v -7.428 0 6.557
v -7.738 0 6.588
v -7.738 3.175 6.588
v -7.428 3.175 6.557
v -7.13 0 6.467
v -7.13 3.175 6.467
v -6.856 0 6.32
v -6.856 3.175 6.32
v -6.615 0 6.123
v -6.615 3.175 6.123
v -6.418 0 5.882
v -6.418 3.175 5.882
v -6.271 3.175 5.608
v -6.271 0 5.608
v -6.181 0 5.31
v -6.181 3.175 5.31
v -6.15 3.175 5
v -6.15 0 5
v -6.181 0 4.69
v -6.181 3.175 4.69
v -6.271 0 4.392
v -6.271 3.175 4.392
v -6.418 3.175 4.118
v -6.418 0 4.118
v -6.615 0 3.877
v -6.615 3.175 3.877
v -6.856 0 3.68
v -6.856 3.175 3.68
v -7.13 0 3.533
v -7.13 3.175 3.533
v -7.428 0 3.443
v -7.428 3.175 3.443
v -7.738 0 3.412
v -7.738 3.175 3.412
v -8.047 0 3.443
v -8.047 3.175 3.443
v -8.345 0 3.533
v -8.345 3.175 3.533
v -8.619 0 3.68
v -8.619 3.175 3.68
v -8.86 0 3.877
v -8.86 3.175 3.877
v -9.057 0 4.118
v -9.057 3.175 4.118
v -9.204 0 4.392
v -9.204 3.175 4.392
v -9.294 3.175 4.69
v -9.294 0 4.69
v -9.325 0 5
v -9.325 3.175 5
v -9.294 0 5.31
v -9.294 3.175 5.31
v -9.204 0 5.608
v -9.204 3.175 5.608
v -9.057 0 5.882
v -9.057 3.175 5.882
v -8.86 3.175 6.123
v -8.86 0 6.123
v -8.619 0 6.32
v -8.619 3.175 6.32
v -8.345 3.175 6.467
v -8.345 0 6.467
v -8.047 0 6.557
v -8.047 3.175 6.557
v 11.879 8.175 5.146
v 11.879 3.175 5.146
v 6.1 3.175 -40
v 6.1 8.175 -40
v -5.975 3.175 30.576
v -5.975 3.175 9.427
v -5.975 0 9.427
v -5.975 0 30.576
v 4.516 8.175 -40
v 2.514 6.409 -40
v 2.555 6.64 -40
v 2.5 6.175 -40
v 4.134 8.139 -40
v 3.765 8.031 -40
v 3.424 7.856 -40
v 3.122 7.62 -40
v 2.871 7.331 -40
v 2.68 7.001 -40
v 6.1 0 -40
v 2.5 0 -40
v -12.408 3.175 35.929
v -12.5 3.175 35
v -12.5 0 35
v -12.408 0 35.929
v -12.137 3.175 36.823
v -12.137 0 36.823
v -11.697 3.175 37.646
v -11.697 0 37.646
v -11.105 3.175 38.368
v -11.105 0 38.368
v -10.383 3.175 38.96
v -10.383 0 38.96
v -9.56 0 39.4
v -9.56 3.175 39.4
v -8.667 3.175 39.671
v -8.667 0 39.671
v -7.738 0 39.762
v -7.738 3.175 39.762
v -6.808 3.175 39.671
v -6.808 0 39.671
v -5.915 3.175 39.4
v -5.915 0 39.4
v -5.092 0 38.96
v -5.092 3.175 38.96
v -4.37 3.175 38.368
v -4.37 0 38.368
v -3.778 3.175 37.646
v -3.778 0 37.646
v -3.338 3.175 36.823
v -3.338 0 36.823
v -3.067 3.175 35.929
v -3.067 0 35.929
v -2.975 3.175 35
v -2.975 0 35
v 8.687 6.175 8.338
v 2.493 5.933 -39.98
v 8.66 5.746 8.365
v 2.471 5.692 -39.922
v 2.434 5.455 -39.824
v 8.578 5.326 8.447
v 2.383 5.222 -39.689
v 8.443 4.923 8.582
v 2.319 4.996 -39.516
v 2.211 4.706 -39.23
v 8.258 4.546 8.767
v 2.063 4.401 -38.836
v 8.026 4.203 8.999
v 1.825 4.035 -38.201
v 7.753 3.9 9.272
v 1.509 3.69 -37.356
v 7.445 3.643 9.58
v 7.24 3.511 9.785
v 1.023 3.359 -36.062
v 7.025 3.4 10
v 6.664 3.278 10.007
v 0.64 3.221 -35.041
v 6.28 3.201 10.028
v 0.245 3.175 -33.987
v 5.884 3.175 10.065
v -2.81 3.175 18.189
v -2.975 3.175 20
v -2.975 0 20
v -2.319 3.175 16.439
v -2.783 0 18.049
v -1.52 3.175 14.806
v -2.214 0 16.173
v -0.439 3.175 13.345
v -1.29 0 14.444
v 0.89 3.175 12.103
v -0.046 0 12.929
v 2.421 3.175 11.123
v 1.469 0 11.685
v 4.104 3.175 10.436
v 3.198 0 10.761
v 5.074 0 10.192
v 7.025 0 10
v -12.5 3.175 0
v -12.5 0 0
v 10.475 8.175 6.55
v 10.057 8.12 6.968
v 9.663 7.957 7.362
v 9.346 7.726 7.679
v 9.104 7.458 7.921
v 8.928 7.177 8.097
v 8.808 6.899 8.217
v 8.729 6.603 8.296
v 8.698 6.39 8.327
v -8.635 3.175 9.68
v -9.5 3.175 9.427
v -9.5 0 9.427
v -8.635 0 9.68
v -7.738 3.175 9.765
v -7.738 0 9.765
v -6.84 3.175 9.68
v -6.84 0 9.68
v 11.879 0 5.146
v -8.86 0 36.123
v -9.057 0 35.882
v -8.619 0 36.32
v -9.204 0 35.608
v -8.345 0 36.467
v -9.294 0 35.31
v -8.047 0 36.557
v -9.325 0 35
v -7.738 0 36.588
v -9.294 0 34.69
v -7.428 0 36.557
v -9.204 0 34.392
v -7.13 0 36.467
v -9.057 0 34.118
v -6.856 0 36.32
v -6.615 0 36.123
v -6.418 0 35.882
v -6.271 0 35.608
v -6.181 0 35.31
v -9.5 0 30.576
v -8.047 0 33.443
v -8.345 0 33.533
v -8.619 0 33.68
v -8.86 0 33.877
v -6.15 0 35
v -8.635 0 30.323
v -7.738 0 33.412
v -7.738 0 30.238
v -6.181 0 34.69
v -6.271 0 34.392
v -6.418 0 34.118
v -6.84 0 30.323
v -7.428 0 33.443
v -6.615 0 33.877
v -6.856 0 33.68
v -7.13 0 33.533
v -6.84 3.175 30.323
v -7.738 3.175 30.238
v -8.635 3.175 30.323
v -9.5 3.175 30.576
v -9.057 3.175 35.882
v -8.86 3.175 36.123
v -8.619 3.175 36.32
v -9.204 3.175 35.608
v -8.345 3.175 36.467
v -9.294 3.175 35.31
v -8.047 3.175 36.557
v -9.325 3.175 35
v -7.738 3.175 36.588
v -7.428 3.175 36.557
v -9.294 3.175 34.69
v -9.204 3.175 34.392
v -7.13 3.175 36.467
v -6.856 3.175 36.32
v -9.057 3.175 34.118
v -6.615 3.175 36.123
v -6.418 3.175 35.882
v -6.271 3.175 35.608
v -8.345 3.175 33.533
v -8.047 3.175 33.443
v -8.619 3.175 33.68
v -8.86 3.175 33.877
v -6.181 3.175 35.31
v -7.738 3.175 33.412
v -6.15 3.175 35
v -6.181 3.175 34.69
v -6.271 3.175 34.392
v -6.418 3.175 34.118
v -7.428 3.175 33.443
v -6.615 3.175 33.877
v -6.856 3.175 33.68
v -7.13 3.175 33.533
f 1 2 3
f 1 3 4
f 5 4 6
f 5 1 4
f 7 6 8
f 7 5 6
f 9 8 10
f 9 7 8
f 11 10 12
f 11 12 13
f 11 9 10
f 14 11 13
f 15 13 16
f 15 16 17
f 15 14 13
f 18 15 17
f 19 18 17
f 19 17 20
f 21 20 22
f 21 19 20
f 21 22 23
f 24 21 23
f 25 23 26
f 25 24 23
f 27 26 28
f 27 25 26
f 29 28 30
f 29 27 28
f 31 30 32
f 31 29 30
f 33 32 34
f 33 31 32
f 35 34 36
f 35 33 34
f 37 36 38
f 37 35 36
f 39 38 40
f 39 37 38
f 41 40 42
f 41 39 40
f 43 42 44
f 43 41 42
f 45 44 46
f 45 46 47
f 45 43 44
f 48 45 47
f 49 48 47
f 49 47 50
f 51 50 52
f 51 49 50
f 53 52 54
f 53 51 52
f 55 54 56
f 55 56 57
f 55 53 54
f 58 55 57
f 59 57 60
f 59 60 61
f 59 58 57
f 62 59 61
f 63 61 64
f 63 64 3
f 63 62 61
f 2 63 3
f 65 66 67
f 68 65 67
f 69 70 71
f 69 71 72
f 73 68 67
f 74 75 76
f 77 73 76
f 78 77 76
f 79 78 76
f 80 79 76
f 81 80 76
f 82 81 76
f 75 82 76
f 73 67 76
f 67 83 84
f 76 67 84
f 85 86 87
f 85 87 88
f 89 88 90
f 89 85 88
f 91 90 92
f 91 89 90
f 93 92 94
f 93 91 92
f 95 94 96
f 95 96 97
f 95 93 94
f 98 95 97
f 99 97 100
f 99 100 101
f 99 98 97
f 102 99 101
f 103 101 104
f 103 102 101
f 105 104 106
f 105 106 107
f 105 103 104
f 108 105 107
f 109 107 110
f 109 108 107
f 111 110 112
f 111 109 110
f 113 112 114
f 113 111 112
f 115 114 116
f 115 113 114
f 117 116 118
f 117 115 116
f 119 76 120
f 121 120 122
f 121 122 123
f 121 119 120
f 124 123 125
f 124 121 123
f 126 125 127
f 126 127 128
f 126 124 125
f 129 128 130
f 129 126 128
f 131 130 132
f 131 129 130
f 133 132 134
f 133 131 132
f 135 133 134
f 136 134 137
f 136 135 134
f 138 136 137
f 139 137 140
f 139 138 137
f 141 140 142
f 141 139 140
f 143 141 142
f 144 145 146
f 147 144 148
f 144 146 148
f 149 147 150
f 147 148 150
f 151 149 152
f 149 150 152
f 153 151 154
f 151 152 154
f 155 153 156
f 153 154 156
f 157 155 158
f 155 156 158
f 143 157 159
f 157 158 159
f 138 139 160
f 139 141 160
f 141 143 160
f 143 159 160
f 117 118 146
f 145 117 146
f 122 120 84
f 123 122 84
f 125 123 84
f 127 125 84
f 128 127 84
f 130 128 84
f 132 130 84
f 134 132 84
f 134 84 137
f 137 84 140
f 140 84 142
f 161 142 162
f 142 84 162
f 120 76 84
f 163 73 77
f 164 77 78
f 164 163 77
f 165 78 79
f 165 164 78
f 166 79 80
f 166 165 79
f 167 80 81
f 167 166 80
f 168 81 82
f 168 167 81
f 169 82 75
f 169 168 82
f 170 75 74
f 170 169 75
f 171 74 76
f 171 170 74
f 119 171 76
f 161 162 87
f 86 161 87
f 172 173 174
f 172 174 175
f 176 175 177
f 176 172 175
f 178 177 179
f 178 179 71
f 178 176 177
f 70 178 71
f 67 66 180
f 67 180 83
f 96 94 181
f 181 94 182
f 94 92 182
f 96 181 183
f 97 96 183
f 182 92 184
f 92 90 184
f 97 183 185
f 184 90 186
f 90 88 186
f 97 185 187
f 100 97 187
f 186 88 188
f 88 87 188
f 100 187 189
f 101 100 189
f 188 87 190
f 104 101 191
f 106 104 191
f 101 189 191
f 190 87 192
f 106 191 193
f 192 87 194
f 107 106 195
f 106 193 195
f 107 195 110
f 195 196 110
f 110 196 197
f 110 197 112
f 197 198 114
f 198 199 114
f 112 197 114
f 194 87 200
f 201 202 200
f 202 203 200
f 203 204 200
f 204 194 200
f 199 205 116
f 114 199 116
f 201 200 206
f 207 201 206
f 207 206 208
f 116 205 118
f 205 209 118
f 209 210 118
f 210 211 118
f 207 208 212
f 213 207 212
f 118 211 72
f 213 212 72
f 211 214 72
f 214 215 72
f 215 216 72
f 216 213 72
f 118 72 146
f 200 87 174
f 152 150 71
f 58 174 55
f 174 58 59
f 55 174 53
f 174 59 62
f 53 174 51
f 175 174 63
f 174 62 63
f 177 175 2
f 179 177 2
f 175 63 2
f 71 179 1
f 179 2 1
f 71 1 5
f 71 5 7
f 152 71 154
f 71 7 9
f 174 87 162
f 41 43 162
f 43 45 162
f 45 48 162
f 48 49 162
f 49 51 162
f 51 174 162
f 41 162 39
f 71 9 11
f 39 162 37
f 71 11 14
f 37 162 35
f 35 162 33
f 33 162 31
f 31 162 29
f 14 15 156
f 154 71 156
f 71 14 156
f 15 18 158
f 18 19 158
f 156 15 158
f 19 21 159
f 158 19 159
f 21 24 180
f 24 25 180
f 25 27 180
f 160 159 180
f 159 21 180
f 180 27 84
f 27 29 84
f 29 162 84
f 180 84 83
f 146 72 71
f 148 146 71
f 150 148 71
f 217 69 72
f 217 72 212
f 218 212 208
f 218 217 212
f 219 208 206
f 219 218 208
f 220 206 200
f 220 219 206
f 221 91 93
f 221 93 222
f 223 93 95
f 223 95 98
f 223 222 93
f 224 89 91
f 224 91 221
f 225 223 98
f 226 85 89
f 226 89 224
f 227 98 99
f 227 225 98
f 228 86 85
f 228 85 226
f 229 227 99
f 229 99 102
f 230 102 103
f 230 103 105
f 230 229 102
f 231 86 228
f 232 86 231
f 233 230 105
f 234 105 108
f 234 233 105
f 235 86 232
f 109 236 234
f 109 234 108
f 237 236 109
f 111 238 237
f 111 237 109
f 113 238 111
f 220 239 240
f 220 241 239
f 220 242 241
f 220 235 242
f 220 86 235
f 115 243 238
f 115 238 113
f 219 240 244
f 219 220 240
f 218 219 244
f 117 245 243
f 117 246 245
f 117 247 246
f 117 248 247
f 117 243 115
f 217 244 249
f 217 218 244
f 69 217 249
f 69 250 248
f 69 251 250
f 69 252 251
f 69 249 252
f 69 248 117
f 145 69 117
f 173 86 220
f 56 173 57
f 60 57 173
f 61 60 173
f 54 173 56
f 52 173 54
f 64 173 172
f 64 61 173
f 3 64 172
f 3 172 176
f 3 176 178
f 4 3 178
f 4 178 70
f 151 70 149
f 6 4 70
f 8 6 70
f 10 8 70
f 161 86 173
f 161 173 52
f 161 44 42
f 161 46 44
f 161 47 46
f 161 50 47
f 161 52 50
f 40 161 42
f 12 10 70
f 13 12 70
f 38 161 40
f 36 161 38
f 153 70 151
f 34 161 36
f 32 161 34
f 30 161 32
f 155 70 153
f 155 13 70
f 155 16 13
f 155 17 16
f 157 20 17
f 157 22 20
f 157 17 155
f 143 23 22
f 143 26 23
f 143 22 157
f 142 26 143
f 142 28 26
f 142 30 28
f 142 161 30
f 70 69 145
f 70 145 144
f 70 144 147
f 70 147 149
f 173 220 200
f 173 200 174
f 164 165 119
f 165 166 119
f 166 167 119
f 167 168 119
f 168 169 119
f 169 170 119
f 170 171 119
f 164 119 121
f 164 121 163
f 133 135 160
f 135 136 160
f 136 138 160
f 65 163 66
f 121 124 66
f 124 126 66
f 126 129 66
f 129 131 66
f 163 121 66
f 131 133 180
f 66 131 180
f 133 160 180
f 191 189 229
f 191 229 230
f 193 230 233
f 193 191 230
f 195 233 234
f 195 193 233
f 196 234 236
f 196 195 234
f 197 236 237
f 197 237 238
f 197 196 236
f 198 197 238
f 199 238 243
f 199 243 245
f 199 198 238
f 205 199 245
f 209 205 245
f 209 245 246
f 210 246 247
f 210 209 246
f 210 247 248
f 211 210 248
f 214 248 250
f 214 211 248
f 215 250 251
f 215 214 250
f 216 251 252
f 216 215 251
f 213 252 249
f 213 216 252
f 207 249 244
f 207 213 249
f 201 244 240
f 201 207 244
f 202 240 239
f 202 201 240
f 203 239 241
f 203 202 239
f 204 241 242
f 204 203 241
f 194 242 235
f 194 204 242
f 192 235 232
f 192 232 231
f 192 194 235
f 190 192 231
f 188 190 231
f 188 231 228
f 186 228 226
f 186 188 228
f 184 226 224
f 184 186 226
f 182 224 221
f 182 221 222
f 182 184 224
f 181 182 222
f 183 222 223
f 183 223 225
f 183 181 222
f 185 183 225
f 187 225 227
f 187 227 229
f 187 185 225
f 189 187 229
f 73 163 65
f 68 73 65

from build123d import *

# Parameters (mm, degrees)
CROQUIS1_R              = 1.5875
SALIENTE_EXTRUIR1_DEPTH = 3.175
CORTAR_EXTRUIR1_DEPTH   = 3.175
CORTAR_EXTRUIR3_DEPTH   = 10
CORTAR_EXTRUIR8_DEPTH   = 10
BOSS_EXTRU_1_DEPTH      = 5
CONG_1_R                = 2
CONG_2_R                = 3


with BuildPart() as part:
    # Croquis1 → Saliente-Extruir1 (new body)
    with BuildSketch(Plane(origin=(0, 0, 0), x_dir=(1, 0, 0), z_dir=(0, 1, 0))):
        with BuildLine():
            Line((-12.5, 0), (-12.5, -40))
            Line((-12.5, -40), (-2.975, -40))
            Line((-2.975, -40), (-2.975, -20))
            ThreePointArc((-2.975, -20), (-0.046067812, -12.928932188), (7.025, -10))
            Line((7.025, -10), (12.5, -10))
            Line((12.5, -10), (12.5, 40))
            Line((12.5, 40), (2.5, 40))
            Line((2.5, 40), (-12.5, 0))
        make_face()
        with Locations(Location((-7.7375, -5, 0), (0, 0, 270))):
            Circle(CROQUIS1_R, mode=Mode.SUBTRACT)
        with Locations(Location((-7.7375, -35, 0), (0, 0, 270))):
            Circle(CROQUIS1_R, mode=Mode.SUBTRACT)
    extrude(amount=SALIENTE_EXTRUIR1_DEPTH)

    # Croquis2 → Cortar-Extruir1 (cut)
    with BuildSketch(Plane(origin=(0, 3.175, 0), x_dir=(1, 0, 0), z_dir=(0, 1, 0))):
        Polygon((12.5, -10), (6.1, 40), (12.5, 40), align=None)
    extrude(amount=-CORTAR_EXTRUIR1_DEPTH, mode=Mode.SUBTRACT)

    # Croquis3 → Cortar-Extruir3 (cut)
    with BuildSketch(Plane(origin=(0, 3.175, 0), x_dir=(1, 0, 0), z_dir=(0, 1, 0))):
        with BuildLine():
            ThreePointArc((-5.975, -30.575635639), (-7.7375, -30.2375), (-9.5, -30.575635639))
            Line((-9.5, -30.575635639), (-9.5, -9.427055314))
            ThreePointArc((-9.5, -9.427055314), (-7.7375, -9.765), (-5.975, -9.427055314))
            Line((-5.975, -9.427055314), (-5.975, -14.803847577))
            Line((-5.975, -14.803847577), (-5.975, -30.575635639))
        make_face()
        with BuildLine():
            ThreePointArc((-12.5, -35), (-7.7375, -39.7625), (-2.975, -35))
            Line((-2.975, -35), (-2.975, -40))
            Line((-2.975, -40), (-12.5, -40))
            Line((-12.5, -40), (-12.5, -35))
        make_face()
    extrude(amount=-CORTAR_EXTRUIR3_DEPTH, mode=Mode.SUBTRACT)

    # Croquis5 → Cortar-Extruir8 (cut)
    with BuildSketch(Plane(origin=(0, 3.175, 0), x_dir=(1, 0, 0), z_dir=(0, 1, 0))):
        Polygon((7.025, -10), (11.878723404, -5.146276596), (12.5, -10), align=None)
    extrude(amount=-CORTAR_EXTRUIR8_DEPTH, mode=Mode.SUBTRACT)

    # Esquisse1 → Boss.-Extru.1 (add)
    with BuildSketch(Plane(origin=(0, 3.175, 0), x_dir=(1, 0, 0), z_dir=(0, 1, 0))):
        Polygon((11.878723404, -5.146276596), (6.1, 40), (2.5, 40), (8.687234043, -8.337765957), align=None)
    extrude(amount=BOSS_EXTRU_1_DEPTH)

    # Congé1
    cong_1_edges = [part.edges().sort_by_distance(p)[0] for p in [
        (5.593617021, 8.175, -15.831117021),
    ]]
    fillet(cong_1_edges, radius=CONG_1_R)

    # Congé2
    cong_2_edges = [part.edges().sort_by_distance(p)[0] for p in [
        (5.593617021, 3.175, -15.831117021),
    ]]
    fillet(cong_2_edges, radius=CONG_2_R - 0.0001)  # a hair under: the kernel refuses the full size


solid = part.part
